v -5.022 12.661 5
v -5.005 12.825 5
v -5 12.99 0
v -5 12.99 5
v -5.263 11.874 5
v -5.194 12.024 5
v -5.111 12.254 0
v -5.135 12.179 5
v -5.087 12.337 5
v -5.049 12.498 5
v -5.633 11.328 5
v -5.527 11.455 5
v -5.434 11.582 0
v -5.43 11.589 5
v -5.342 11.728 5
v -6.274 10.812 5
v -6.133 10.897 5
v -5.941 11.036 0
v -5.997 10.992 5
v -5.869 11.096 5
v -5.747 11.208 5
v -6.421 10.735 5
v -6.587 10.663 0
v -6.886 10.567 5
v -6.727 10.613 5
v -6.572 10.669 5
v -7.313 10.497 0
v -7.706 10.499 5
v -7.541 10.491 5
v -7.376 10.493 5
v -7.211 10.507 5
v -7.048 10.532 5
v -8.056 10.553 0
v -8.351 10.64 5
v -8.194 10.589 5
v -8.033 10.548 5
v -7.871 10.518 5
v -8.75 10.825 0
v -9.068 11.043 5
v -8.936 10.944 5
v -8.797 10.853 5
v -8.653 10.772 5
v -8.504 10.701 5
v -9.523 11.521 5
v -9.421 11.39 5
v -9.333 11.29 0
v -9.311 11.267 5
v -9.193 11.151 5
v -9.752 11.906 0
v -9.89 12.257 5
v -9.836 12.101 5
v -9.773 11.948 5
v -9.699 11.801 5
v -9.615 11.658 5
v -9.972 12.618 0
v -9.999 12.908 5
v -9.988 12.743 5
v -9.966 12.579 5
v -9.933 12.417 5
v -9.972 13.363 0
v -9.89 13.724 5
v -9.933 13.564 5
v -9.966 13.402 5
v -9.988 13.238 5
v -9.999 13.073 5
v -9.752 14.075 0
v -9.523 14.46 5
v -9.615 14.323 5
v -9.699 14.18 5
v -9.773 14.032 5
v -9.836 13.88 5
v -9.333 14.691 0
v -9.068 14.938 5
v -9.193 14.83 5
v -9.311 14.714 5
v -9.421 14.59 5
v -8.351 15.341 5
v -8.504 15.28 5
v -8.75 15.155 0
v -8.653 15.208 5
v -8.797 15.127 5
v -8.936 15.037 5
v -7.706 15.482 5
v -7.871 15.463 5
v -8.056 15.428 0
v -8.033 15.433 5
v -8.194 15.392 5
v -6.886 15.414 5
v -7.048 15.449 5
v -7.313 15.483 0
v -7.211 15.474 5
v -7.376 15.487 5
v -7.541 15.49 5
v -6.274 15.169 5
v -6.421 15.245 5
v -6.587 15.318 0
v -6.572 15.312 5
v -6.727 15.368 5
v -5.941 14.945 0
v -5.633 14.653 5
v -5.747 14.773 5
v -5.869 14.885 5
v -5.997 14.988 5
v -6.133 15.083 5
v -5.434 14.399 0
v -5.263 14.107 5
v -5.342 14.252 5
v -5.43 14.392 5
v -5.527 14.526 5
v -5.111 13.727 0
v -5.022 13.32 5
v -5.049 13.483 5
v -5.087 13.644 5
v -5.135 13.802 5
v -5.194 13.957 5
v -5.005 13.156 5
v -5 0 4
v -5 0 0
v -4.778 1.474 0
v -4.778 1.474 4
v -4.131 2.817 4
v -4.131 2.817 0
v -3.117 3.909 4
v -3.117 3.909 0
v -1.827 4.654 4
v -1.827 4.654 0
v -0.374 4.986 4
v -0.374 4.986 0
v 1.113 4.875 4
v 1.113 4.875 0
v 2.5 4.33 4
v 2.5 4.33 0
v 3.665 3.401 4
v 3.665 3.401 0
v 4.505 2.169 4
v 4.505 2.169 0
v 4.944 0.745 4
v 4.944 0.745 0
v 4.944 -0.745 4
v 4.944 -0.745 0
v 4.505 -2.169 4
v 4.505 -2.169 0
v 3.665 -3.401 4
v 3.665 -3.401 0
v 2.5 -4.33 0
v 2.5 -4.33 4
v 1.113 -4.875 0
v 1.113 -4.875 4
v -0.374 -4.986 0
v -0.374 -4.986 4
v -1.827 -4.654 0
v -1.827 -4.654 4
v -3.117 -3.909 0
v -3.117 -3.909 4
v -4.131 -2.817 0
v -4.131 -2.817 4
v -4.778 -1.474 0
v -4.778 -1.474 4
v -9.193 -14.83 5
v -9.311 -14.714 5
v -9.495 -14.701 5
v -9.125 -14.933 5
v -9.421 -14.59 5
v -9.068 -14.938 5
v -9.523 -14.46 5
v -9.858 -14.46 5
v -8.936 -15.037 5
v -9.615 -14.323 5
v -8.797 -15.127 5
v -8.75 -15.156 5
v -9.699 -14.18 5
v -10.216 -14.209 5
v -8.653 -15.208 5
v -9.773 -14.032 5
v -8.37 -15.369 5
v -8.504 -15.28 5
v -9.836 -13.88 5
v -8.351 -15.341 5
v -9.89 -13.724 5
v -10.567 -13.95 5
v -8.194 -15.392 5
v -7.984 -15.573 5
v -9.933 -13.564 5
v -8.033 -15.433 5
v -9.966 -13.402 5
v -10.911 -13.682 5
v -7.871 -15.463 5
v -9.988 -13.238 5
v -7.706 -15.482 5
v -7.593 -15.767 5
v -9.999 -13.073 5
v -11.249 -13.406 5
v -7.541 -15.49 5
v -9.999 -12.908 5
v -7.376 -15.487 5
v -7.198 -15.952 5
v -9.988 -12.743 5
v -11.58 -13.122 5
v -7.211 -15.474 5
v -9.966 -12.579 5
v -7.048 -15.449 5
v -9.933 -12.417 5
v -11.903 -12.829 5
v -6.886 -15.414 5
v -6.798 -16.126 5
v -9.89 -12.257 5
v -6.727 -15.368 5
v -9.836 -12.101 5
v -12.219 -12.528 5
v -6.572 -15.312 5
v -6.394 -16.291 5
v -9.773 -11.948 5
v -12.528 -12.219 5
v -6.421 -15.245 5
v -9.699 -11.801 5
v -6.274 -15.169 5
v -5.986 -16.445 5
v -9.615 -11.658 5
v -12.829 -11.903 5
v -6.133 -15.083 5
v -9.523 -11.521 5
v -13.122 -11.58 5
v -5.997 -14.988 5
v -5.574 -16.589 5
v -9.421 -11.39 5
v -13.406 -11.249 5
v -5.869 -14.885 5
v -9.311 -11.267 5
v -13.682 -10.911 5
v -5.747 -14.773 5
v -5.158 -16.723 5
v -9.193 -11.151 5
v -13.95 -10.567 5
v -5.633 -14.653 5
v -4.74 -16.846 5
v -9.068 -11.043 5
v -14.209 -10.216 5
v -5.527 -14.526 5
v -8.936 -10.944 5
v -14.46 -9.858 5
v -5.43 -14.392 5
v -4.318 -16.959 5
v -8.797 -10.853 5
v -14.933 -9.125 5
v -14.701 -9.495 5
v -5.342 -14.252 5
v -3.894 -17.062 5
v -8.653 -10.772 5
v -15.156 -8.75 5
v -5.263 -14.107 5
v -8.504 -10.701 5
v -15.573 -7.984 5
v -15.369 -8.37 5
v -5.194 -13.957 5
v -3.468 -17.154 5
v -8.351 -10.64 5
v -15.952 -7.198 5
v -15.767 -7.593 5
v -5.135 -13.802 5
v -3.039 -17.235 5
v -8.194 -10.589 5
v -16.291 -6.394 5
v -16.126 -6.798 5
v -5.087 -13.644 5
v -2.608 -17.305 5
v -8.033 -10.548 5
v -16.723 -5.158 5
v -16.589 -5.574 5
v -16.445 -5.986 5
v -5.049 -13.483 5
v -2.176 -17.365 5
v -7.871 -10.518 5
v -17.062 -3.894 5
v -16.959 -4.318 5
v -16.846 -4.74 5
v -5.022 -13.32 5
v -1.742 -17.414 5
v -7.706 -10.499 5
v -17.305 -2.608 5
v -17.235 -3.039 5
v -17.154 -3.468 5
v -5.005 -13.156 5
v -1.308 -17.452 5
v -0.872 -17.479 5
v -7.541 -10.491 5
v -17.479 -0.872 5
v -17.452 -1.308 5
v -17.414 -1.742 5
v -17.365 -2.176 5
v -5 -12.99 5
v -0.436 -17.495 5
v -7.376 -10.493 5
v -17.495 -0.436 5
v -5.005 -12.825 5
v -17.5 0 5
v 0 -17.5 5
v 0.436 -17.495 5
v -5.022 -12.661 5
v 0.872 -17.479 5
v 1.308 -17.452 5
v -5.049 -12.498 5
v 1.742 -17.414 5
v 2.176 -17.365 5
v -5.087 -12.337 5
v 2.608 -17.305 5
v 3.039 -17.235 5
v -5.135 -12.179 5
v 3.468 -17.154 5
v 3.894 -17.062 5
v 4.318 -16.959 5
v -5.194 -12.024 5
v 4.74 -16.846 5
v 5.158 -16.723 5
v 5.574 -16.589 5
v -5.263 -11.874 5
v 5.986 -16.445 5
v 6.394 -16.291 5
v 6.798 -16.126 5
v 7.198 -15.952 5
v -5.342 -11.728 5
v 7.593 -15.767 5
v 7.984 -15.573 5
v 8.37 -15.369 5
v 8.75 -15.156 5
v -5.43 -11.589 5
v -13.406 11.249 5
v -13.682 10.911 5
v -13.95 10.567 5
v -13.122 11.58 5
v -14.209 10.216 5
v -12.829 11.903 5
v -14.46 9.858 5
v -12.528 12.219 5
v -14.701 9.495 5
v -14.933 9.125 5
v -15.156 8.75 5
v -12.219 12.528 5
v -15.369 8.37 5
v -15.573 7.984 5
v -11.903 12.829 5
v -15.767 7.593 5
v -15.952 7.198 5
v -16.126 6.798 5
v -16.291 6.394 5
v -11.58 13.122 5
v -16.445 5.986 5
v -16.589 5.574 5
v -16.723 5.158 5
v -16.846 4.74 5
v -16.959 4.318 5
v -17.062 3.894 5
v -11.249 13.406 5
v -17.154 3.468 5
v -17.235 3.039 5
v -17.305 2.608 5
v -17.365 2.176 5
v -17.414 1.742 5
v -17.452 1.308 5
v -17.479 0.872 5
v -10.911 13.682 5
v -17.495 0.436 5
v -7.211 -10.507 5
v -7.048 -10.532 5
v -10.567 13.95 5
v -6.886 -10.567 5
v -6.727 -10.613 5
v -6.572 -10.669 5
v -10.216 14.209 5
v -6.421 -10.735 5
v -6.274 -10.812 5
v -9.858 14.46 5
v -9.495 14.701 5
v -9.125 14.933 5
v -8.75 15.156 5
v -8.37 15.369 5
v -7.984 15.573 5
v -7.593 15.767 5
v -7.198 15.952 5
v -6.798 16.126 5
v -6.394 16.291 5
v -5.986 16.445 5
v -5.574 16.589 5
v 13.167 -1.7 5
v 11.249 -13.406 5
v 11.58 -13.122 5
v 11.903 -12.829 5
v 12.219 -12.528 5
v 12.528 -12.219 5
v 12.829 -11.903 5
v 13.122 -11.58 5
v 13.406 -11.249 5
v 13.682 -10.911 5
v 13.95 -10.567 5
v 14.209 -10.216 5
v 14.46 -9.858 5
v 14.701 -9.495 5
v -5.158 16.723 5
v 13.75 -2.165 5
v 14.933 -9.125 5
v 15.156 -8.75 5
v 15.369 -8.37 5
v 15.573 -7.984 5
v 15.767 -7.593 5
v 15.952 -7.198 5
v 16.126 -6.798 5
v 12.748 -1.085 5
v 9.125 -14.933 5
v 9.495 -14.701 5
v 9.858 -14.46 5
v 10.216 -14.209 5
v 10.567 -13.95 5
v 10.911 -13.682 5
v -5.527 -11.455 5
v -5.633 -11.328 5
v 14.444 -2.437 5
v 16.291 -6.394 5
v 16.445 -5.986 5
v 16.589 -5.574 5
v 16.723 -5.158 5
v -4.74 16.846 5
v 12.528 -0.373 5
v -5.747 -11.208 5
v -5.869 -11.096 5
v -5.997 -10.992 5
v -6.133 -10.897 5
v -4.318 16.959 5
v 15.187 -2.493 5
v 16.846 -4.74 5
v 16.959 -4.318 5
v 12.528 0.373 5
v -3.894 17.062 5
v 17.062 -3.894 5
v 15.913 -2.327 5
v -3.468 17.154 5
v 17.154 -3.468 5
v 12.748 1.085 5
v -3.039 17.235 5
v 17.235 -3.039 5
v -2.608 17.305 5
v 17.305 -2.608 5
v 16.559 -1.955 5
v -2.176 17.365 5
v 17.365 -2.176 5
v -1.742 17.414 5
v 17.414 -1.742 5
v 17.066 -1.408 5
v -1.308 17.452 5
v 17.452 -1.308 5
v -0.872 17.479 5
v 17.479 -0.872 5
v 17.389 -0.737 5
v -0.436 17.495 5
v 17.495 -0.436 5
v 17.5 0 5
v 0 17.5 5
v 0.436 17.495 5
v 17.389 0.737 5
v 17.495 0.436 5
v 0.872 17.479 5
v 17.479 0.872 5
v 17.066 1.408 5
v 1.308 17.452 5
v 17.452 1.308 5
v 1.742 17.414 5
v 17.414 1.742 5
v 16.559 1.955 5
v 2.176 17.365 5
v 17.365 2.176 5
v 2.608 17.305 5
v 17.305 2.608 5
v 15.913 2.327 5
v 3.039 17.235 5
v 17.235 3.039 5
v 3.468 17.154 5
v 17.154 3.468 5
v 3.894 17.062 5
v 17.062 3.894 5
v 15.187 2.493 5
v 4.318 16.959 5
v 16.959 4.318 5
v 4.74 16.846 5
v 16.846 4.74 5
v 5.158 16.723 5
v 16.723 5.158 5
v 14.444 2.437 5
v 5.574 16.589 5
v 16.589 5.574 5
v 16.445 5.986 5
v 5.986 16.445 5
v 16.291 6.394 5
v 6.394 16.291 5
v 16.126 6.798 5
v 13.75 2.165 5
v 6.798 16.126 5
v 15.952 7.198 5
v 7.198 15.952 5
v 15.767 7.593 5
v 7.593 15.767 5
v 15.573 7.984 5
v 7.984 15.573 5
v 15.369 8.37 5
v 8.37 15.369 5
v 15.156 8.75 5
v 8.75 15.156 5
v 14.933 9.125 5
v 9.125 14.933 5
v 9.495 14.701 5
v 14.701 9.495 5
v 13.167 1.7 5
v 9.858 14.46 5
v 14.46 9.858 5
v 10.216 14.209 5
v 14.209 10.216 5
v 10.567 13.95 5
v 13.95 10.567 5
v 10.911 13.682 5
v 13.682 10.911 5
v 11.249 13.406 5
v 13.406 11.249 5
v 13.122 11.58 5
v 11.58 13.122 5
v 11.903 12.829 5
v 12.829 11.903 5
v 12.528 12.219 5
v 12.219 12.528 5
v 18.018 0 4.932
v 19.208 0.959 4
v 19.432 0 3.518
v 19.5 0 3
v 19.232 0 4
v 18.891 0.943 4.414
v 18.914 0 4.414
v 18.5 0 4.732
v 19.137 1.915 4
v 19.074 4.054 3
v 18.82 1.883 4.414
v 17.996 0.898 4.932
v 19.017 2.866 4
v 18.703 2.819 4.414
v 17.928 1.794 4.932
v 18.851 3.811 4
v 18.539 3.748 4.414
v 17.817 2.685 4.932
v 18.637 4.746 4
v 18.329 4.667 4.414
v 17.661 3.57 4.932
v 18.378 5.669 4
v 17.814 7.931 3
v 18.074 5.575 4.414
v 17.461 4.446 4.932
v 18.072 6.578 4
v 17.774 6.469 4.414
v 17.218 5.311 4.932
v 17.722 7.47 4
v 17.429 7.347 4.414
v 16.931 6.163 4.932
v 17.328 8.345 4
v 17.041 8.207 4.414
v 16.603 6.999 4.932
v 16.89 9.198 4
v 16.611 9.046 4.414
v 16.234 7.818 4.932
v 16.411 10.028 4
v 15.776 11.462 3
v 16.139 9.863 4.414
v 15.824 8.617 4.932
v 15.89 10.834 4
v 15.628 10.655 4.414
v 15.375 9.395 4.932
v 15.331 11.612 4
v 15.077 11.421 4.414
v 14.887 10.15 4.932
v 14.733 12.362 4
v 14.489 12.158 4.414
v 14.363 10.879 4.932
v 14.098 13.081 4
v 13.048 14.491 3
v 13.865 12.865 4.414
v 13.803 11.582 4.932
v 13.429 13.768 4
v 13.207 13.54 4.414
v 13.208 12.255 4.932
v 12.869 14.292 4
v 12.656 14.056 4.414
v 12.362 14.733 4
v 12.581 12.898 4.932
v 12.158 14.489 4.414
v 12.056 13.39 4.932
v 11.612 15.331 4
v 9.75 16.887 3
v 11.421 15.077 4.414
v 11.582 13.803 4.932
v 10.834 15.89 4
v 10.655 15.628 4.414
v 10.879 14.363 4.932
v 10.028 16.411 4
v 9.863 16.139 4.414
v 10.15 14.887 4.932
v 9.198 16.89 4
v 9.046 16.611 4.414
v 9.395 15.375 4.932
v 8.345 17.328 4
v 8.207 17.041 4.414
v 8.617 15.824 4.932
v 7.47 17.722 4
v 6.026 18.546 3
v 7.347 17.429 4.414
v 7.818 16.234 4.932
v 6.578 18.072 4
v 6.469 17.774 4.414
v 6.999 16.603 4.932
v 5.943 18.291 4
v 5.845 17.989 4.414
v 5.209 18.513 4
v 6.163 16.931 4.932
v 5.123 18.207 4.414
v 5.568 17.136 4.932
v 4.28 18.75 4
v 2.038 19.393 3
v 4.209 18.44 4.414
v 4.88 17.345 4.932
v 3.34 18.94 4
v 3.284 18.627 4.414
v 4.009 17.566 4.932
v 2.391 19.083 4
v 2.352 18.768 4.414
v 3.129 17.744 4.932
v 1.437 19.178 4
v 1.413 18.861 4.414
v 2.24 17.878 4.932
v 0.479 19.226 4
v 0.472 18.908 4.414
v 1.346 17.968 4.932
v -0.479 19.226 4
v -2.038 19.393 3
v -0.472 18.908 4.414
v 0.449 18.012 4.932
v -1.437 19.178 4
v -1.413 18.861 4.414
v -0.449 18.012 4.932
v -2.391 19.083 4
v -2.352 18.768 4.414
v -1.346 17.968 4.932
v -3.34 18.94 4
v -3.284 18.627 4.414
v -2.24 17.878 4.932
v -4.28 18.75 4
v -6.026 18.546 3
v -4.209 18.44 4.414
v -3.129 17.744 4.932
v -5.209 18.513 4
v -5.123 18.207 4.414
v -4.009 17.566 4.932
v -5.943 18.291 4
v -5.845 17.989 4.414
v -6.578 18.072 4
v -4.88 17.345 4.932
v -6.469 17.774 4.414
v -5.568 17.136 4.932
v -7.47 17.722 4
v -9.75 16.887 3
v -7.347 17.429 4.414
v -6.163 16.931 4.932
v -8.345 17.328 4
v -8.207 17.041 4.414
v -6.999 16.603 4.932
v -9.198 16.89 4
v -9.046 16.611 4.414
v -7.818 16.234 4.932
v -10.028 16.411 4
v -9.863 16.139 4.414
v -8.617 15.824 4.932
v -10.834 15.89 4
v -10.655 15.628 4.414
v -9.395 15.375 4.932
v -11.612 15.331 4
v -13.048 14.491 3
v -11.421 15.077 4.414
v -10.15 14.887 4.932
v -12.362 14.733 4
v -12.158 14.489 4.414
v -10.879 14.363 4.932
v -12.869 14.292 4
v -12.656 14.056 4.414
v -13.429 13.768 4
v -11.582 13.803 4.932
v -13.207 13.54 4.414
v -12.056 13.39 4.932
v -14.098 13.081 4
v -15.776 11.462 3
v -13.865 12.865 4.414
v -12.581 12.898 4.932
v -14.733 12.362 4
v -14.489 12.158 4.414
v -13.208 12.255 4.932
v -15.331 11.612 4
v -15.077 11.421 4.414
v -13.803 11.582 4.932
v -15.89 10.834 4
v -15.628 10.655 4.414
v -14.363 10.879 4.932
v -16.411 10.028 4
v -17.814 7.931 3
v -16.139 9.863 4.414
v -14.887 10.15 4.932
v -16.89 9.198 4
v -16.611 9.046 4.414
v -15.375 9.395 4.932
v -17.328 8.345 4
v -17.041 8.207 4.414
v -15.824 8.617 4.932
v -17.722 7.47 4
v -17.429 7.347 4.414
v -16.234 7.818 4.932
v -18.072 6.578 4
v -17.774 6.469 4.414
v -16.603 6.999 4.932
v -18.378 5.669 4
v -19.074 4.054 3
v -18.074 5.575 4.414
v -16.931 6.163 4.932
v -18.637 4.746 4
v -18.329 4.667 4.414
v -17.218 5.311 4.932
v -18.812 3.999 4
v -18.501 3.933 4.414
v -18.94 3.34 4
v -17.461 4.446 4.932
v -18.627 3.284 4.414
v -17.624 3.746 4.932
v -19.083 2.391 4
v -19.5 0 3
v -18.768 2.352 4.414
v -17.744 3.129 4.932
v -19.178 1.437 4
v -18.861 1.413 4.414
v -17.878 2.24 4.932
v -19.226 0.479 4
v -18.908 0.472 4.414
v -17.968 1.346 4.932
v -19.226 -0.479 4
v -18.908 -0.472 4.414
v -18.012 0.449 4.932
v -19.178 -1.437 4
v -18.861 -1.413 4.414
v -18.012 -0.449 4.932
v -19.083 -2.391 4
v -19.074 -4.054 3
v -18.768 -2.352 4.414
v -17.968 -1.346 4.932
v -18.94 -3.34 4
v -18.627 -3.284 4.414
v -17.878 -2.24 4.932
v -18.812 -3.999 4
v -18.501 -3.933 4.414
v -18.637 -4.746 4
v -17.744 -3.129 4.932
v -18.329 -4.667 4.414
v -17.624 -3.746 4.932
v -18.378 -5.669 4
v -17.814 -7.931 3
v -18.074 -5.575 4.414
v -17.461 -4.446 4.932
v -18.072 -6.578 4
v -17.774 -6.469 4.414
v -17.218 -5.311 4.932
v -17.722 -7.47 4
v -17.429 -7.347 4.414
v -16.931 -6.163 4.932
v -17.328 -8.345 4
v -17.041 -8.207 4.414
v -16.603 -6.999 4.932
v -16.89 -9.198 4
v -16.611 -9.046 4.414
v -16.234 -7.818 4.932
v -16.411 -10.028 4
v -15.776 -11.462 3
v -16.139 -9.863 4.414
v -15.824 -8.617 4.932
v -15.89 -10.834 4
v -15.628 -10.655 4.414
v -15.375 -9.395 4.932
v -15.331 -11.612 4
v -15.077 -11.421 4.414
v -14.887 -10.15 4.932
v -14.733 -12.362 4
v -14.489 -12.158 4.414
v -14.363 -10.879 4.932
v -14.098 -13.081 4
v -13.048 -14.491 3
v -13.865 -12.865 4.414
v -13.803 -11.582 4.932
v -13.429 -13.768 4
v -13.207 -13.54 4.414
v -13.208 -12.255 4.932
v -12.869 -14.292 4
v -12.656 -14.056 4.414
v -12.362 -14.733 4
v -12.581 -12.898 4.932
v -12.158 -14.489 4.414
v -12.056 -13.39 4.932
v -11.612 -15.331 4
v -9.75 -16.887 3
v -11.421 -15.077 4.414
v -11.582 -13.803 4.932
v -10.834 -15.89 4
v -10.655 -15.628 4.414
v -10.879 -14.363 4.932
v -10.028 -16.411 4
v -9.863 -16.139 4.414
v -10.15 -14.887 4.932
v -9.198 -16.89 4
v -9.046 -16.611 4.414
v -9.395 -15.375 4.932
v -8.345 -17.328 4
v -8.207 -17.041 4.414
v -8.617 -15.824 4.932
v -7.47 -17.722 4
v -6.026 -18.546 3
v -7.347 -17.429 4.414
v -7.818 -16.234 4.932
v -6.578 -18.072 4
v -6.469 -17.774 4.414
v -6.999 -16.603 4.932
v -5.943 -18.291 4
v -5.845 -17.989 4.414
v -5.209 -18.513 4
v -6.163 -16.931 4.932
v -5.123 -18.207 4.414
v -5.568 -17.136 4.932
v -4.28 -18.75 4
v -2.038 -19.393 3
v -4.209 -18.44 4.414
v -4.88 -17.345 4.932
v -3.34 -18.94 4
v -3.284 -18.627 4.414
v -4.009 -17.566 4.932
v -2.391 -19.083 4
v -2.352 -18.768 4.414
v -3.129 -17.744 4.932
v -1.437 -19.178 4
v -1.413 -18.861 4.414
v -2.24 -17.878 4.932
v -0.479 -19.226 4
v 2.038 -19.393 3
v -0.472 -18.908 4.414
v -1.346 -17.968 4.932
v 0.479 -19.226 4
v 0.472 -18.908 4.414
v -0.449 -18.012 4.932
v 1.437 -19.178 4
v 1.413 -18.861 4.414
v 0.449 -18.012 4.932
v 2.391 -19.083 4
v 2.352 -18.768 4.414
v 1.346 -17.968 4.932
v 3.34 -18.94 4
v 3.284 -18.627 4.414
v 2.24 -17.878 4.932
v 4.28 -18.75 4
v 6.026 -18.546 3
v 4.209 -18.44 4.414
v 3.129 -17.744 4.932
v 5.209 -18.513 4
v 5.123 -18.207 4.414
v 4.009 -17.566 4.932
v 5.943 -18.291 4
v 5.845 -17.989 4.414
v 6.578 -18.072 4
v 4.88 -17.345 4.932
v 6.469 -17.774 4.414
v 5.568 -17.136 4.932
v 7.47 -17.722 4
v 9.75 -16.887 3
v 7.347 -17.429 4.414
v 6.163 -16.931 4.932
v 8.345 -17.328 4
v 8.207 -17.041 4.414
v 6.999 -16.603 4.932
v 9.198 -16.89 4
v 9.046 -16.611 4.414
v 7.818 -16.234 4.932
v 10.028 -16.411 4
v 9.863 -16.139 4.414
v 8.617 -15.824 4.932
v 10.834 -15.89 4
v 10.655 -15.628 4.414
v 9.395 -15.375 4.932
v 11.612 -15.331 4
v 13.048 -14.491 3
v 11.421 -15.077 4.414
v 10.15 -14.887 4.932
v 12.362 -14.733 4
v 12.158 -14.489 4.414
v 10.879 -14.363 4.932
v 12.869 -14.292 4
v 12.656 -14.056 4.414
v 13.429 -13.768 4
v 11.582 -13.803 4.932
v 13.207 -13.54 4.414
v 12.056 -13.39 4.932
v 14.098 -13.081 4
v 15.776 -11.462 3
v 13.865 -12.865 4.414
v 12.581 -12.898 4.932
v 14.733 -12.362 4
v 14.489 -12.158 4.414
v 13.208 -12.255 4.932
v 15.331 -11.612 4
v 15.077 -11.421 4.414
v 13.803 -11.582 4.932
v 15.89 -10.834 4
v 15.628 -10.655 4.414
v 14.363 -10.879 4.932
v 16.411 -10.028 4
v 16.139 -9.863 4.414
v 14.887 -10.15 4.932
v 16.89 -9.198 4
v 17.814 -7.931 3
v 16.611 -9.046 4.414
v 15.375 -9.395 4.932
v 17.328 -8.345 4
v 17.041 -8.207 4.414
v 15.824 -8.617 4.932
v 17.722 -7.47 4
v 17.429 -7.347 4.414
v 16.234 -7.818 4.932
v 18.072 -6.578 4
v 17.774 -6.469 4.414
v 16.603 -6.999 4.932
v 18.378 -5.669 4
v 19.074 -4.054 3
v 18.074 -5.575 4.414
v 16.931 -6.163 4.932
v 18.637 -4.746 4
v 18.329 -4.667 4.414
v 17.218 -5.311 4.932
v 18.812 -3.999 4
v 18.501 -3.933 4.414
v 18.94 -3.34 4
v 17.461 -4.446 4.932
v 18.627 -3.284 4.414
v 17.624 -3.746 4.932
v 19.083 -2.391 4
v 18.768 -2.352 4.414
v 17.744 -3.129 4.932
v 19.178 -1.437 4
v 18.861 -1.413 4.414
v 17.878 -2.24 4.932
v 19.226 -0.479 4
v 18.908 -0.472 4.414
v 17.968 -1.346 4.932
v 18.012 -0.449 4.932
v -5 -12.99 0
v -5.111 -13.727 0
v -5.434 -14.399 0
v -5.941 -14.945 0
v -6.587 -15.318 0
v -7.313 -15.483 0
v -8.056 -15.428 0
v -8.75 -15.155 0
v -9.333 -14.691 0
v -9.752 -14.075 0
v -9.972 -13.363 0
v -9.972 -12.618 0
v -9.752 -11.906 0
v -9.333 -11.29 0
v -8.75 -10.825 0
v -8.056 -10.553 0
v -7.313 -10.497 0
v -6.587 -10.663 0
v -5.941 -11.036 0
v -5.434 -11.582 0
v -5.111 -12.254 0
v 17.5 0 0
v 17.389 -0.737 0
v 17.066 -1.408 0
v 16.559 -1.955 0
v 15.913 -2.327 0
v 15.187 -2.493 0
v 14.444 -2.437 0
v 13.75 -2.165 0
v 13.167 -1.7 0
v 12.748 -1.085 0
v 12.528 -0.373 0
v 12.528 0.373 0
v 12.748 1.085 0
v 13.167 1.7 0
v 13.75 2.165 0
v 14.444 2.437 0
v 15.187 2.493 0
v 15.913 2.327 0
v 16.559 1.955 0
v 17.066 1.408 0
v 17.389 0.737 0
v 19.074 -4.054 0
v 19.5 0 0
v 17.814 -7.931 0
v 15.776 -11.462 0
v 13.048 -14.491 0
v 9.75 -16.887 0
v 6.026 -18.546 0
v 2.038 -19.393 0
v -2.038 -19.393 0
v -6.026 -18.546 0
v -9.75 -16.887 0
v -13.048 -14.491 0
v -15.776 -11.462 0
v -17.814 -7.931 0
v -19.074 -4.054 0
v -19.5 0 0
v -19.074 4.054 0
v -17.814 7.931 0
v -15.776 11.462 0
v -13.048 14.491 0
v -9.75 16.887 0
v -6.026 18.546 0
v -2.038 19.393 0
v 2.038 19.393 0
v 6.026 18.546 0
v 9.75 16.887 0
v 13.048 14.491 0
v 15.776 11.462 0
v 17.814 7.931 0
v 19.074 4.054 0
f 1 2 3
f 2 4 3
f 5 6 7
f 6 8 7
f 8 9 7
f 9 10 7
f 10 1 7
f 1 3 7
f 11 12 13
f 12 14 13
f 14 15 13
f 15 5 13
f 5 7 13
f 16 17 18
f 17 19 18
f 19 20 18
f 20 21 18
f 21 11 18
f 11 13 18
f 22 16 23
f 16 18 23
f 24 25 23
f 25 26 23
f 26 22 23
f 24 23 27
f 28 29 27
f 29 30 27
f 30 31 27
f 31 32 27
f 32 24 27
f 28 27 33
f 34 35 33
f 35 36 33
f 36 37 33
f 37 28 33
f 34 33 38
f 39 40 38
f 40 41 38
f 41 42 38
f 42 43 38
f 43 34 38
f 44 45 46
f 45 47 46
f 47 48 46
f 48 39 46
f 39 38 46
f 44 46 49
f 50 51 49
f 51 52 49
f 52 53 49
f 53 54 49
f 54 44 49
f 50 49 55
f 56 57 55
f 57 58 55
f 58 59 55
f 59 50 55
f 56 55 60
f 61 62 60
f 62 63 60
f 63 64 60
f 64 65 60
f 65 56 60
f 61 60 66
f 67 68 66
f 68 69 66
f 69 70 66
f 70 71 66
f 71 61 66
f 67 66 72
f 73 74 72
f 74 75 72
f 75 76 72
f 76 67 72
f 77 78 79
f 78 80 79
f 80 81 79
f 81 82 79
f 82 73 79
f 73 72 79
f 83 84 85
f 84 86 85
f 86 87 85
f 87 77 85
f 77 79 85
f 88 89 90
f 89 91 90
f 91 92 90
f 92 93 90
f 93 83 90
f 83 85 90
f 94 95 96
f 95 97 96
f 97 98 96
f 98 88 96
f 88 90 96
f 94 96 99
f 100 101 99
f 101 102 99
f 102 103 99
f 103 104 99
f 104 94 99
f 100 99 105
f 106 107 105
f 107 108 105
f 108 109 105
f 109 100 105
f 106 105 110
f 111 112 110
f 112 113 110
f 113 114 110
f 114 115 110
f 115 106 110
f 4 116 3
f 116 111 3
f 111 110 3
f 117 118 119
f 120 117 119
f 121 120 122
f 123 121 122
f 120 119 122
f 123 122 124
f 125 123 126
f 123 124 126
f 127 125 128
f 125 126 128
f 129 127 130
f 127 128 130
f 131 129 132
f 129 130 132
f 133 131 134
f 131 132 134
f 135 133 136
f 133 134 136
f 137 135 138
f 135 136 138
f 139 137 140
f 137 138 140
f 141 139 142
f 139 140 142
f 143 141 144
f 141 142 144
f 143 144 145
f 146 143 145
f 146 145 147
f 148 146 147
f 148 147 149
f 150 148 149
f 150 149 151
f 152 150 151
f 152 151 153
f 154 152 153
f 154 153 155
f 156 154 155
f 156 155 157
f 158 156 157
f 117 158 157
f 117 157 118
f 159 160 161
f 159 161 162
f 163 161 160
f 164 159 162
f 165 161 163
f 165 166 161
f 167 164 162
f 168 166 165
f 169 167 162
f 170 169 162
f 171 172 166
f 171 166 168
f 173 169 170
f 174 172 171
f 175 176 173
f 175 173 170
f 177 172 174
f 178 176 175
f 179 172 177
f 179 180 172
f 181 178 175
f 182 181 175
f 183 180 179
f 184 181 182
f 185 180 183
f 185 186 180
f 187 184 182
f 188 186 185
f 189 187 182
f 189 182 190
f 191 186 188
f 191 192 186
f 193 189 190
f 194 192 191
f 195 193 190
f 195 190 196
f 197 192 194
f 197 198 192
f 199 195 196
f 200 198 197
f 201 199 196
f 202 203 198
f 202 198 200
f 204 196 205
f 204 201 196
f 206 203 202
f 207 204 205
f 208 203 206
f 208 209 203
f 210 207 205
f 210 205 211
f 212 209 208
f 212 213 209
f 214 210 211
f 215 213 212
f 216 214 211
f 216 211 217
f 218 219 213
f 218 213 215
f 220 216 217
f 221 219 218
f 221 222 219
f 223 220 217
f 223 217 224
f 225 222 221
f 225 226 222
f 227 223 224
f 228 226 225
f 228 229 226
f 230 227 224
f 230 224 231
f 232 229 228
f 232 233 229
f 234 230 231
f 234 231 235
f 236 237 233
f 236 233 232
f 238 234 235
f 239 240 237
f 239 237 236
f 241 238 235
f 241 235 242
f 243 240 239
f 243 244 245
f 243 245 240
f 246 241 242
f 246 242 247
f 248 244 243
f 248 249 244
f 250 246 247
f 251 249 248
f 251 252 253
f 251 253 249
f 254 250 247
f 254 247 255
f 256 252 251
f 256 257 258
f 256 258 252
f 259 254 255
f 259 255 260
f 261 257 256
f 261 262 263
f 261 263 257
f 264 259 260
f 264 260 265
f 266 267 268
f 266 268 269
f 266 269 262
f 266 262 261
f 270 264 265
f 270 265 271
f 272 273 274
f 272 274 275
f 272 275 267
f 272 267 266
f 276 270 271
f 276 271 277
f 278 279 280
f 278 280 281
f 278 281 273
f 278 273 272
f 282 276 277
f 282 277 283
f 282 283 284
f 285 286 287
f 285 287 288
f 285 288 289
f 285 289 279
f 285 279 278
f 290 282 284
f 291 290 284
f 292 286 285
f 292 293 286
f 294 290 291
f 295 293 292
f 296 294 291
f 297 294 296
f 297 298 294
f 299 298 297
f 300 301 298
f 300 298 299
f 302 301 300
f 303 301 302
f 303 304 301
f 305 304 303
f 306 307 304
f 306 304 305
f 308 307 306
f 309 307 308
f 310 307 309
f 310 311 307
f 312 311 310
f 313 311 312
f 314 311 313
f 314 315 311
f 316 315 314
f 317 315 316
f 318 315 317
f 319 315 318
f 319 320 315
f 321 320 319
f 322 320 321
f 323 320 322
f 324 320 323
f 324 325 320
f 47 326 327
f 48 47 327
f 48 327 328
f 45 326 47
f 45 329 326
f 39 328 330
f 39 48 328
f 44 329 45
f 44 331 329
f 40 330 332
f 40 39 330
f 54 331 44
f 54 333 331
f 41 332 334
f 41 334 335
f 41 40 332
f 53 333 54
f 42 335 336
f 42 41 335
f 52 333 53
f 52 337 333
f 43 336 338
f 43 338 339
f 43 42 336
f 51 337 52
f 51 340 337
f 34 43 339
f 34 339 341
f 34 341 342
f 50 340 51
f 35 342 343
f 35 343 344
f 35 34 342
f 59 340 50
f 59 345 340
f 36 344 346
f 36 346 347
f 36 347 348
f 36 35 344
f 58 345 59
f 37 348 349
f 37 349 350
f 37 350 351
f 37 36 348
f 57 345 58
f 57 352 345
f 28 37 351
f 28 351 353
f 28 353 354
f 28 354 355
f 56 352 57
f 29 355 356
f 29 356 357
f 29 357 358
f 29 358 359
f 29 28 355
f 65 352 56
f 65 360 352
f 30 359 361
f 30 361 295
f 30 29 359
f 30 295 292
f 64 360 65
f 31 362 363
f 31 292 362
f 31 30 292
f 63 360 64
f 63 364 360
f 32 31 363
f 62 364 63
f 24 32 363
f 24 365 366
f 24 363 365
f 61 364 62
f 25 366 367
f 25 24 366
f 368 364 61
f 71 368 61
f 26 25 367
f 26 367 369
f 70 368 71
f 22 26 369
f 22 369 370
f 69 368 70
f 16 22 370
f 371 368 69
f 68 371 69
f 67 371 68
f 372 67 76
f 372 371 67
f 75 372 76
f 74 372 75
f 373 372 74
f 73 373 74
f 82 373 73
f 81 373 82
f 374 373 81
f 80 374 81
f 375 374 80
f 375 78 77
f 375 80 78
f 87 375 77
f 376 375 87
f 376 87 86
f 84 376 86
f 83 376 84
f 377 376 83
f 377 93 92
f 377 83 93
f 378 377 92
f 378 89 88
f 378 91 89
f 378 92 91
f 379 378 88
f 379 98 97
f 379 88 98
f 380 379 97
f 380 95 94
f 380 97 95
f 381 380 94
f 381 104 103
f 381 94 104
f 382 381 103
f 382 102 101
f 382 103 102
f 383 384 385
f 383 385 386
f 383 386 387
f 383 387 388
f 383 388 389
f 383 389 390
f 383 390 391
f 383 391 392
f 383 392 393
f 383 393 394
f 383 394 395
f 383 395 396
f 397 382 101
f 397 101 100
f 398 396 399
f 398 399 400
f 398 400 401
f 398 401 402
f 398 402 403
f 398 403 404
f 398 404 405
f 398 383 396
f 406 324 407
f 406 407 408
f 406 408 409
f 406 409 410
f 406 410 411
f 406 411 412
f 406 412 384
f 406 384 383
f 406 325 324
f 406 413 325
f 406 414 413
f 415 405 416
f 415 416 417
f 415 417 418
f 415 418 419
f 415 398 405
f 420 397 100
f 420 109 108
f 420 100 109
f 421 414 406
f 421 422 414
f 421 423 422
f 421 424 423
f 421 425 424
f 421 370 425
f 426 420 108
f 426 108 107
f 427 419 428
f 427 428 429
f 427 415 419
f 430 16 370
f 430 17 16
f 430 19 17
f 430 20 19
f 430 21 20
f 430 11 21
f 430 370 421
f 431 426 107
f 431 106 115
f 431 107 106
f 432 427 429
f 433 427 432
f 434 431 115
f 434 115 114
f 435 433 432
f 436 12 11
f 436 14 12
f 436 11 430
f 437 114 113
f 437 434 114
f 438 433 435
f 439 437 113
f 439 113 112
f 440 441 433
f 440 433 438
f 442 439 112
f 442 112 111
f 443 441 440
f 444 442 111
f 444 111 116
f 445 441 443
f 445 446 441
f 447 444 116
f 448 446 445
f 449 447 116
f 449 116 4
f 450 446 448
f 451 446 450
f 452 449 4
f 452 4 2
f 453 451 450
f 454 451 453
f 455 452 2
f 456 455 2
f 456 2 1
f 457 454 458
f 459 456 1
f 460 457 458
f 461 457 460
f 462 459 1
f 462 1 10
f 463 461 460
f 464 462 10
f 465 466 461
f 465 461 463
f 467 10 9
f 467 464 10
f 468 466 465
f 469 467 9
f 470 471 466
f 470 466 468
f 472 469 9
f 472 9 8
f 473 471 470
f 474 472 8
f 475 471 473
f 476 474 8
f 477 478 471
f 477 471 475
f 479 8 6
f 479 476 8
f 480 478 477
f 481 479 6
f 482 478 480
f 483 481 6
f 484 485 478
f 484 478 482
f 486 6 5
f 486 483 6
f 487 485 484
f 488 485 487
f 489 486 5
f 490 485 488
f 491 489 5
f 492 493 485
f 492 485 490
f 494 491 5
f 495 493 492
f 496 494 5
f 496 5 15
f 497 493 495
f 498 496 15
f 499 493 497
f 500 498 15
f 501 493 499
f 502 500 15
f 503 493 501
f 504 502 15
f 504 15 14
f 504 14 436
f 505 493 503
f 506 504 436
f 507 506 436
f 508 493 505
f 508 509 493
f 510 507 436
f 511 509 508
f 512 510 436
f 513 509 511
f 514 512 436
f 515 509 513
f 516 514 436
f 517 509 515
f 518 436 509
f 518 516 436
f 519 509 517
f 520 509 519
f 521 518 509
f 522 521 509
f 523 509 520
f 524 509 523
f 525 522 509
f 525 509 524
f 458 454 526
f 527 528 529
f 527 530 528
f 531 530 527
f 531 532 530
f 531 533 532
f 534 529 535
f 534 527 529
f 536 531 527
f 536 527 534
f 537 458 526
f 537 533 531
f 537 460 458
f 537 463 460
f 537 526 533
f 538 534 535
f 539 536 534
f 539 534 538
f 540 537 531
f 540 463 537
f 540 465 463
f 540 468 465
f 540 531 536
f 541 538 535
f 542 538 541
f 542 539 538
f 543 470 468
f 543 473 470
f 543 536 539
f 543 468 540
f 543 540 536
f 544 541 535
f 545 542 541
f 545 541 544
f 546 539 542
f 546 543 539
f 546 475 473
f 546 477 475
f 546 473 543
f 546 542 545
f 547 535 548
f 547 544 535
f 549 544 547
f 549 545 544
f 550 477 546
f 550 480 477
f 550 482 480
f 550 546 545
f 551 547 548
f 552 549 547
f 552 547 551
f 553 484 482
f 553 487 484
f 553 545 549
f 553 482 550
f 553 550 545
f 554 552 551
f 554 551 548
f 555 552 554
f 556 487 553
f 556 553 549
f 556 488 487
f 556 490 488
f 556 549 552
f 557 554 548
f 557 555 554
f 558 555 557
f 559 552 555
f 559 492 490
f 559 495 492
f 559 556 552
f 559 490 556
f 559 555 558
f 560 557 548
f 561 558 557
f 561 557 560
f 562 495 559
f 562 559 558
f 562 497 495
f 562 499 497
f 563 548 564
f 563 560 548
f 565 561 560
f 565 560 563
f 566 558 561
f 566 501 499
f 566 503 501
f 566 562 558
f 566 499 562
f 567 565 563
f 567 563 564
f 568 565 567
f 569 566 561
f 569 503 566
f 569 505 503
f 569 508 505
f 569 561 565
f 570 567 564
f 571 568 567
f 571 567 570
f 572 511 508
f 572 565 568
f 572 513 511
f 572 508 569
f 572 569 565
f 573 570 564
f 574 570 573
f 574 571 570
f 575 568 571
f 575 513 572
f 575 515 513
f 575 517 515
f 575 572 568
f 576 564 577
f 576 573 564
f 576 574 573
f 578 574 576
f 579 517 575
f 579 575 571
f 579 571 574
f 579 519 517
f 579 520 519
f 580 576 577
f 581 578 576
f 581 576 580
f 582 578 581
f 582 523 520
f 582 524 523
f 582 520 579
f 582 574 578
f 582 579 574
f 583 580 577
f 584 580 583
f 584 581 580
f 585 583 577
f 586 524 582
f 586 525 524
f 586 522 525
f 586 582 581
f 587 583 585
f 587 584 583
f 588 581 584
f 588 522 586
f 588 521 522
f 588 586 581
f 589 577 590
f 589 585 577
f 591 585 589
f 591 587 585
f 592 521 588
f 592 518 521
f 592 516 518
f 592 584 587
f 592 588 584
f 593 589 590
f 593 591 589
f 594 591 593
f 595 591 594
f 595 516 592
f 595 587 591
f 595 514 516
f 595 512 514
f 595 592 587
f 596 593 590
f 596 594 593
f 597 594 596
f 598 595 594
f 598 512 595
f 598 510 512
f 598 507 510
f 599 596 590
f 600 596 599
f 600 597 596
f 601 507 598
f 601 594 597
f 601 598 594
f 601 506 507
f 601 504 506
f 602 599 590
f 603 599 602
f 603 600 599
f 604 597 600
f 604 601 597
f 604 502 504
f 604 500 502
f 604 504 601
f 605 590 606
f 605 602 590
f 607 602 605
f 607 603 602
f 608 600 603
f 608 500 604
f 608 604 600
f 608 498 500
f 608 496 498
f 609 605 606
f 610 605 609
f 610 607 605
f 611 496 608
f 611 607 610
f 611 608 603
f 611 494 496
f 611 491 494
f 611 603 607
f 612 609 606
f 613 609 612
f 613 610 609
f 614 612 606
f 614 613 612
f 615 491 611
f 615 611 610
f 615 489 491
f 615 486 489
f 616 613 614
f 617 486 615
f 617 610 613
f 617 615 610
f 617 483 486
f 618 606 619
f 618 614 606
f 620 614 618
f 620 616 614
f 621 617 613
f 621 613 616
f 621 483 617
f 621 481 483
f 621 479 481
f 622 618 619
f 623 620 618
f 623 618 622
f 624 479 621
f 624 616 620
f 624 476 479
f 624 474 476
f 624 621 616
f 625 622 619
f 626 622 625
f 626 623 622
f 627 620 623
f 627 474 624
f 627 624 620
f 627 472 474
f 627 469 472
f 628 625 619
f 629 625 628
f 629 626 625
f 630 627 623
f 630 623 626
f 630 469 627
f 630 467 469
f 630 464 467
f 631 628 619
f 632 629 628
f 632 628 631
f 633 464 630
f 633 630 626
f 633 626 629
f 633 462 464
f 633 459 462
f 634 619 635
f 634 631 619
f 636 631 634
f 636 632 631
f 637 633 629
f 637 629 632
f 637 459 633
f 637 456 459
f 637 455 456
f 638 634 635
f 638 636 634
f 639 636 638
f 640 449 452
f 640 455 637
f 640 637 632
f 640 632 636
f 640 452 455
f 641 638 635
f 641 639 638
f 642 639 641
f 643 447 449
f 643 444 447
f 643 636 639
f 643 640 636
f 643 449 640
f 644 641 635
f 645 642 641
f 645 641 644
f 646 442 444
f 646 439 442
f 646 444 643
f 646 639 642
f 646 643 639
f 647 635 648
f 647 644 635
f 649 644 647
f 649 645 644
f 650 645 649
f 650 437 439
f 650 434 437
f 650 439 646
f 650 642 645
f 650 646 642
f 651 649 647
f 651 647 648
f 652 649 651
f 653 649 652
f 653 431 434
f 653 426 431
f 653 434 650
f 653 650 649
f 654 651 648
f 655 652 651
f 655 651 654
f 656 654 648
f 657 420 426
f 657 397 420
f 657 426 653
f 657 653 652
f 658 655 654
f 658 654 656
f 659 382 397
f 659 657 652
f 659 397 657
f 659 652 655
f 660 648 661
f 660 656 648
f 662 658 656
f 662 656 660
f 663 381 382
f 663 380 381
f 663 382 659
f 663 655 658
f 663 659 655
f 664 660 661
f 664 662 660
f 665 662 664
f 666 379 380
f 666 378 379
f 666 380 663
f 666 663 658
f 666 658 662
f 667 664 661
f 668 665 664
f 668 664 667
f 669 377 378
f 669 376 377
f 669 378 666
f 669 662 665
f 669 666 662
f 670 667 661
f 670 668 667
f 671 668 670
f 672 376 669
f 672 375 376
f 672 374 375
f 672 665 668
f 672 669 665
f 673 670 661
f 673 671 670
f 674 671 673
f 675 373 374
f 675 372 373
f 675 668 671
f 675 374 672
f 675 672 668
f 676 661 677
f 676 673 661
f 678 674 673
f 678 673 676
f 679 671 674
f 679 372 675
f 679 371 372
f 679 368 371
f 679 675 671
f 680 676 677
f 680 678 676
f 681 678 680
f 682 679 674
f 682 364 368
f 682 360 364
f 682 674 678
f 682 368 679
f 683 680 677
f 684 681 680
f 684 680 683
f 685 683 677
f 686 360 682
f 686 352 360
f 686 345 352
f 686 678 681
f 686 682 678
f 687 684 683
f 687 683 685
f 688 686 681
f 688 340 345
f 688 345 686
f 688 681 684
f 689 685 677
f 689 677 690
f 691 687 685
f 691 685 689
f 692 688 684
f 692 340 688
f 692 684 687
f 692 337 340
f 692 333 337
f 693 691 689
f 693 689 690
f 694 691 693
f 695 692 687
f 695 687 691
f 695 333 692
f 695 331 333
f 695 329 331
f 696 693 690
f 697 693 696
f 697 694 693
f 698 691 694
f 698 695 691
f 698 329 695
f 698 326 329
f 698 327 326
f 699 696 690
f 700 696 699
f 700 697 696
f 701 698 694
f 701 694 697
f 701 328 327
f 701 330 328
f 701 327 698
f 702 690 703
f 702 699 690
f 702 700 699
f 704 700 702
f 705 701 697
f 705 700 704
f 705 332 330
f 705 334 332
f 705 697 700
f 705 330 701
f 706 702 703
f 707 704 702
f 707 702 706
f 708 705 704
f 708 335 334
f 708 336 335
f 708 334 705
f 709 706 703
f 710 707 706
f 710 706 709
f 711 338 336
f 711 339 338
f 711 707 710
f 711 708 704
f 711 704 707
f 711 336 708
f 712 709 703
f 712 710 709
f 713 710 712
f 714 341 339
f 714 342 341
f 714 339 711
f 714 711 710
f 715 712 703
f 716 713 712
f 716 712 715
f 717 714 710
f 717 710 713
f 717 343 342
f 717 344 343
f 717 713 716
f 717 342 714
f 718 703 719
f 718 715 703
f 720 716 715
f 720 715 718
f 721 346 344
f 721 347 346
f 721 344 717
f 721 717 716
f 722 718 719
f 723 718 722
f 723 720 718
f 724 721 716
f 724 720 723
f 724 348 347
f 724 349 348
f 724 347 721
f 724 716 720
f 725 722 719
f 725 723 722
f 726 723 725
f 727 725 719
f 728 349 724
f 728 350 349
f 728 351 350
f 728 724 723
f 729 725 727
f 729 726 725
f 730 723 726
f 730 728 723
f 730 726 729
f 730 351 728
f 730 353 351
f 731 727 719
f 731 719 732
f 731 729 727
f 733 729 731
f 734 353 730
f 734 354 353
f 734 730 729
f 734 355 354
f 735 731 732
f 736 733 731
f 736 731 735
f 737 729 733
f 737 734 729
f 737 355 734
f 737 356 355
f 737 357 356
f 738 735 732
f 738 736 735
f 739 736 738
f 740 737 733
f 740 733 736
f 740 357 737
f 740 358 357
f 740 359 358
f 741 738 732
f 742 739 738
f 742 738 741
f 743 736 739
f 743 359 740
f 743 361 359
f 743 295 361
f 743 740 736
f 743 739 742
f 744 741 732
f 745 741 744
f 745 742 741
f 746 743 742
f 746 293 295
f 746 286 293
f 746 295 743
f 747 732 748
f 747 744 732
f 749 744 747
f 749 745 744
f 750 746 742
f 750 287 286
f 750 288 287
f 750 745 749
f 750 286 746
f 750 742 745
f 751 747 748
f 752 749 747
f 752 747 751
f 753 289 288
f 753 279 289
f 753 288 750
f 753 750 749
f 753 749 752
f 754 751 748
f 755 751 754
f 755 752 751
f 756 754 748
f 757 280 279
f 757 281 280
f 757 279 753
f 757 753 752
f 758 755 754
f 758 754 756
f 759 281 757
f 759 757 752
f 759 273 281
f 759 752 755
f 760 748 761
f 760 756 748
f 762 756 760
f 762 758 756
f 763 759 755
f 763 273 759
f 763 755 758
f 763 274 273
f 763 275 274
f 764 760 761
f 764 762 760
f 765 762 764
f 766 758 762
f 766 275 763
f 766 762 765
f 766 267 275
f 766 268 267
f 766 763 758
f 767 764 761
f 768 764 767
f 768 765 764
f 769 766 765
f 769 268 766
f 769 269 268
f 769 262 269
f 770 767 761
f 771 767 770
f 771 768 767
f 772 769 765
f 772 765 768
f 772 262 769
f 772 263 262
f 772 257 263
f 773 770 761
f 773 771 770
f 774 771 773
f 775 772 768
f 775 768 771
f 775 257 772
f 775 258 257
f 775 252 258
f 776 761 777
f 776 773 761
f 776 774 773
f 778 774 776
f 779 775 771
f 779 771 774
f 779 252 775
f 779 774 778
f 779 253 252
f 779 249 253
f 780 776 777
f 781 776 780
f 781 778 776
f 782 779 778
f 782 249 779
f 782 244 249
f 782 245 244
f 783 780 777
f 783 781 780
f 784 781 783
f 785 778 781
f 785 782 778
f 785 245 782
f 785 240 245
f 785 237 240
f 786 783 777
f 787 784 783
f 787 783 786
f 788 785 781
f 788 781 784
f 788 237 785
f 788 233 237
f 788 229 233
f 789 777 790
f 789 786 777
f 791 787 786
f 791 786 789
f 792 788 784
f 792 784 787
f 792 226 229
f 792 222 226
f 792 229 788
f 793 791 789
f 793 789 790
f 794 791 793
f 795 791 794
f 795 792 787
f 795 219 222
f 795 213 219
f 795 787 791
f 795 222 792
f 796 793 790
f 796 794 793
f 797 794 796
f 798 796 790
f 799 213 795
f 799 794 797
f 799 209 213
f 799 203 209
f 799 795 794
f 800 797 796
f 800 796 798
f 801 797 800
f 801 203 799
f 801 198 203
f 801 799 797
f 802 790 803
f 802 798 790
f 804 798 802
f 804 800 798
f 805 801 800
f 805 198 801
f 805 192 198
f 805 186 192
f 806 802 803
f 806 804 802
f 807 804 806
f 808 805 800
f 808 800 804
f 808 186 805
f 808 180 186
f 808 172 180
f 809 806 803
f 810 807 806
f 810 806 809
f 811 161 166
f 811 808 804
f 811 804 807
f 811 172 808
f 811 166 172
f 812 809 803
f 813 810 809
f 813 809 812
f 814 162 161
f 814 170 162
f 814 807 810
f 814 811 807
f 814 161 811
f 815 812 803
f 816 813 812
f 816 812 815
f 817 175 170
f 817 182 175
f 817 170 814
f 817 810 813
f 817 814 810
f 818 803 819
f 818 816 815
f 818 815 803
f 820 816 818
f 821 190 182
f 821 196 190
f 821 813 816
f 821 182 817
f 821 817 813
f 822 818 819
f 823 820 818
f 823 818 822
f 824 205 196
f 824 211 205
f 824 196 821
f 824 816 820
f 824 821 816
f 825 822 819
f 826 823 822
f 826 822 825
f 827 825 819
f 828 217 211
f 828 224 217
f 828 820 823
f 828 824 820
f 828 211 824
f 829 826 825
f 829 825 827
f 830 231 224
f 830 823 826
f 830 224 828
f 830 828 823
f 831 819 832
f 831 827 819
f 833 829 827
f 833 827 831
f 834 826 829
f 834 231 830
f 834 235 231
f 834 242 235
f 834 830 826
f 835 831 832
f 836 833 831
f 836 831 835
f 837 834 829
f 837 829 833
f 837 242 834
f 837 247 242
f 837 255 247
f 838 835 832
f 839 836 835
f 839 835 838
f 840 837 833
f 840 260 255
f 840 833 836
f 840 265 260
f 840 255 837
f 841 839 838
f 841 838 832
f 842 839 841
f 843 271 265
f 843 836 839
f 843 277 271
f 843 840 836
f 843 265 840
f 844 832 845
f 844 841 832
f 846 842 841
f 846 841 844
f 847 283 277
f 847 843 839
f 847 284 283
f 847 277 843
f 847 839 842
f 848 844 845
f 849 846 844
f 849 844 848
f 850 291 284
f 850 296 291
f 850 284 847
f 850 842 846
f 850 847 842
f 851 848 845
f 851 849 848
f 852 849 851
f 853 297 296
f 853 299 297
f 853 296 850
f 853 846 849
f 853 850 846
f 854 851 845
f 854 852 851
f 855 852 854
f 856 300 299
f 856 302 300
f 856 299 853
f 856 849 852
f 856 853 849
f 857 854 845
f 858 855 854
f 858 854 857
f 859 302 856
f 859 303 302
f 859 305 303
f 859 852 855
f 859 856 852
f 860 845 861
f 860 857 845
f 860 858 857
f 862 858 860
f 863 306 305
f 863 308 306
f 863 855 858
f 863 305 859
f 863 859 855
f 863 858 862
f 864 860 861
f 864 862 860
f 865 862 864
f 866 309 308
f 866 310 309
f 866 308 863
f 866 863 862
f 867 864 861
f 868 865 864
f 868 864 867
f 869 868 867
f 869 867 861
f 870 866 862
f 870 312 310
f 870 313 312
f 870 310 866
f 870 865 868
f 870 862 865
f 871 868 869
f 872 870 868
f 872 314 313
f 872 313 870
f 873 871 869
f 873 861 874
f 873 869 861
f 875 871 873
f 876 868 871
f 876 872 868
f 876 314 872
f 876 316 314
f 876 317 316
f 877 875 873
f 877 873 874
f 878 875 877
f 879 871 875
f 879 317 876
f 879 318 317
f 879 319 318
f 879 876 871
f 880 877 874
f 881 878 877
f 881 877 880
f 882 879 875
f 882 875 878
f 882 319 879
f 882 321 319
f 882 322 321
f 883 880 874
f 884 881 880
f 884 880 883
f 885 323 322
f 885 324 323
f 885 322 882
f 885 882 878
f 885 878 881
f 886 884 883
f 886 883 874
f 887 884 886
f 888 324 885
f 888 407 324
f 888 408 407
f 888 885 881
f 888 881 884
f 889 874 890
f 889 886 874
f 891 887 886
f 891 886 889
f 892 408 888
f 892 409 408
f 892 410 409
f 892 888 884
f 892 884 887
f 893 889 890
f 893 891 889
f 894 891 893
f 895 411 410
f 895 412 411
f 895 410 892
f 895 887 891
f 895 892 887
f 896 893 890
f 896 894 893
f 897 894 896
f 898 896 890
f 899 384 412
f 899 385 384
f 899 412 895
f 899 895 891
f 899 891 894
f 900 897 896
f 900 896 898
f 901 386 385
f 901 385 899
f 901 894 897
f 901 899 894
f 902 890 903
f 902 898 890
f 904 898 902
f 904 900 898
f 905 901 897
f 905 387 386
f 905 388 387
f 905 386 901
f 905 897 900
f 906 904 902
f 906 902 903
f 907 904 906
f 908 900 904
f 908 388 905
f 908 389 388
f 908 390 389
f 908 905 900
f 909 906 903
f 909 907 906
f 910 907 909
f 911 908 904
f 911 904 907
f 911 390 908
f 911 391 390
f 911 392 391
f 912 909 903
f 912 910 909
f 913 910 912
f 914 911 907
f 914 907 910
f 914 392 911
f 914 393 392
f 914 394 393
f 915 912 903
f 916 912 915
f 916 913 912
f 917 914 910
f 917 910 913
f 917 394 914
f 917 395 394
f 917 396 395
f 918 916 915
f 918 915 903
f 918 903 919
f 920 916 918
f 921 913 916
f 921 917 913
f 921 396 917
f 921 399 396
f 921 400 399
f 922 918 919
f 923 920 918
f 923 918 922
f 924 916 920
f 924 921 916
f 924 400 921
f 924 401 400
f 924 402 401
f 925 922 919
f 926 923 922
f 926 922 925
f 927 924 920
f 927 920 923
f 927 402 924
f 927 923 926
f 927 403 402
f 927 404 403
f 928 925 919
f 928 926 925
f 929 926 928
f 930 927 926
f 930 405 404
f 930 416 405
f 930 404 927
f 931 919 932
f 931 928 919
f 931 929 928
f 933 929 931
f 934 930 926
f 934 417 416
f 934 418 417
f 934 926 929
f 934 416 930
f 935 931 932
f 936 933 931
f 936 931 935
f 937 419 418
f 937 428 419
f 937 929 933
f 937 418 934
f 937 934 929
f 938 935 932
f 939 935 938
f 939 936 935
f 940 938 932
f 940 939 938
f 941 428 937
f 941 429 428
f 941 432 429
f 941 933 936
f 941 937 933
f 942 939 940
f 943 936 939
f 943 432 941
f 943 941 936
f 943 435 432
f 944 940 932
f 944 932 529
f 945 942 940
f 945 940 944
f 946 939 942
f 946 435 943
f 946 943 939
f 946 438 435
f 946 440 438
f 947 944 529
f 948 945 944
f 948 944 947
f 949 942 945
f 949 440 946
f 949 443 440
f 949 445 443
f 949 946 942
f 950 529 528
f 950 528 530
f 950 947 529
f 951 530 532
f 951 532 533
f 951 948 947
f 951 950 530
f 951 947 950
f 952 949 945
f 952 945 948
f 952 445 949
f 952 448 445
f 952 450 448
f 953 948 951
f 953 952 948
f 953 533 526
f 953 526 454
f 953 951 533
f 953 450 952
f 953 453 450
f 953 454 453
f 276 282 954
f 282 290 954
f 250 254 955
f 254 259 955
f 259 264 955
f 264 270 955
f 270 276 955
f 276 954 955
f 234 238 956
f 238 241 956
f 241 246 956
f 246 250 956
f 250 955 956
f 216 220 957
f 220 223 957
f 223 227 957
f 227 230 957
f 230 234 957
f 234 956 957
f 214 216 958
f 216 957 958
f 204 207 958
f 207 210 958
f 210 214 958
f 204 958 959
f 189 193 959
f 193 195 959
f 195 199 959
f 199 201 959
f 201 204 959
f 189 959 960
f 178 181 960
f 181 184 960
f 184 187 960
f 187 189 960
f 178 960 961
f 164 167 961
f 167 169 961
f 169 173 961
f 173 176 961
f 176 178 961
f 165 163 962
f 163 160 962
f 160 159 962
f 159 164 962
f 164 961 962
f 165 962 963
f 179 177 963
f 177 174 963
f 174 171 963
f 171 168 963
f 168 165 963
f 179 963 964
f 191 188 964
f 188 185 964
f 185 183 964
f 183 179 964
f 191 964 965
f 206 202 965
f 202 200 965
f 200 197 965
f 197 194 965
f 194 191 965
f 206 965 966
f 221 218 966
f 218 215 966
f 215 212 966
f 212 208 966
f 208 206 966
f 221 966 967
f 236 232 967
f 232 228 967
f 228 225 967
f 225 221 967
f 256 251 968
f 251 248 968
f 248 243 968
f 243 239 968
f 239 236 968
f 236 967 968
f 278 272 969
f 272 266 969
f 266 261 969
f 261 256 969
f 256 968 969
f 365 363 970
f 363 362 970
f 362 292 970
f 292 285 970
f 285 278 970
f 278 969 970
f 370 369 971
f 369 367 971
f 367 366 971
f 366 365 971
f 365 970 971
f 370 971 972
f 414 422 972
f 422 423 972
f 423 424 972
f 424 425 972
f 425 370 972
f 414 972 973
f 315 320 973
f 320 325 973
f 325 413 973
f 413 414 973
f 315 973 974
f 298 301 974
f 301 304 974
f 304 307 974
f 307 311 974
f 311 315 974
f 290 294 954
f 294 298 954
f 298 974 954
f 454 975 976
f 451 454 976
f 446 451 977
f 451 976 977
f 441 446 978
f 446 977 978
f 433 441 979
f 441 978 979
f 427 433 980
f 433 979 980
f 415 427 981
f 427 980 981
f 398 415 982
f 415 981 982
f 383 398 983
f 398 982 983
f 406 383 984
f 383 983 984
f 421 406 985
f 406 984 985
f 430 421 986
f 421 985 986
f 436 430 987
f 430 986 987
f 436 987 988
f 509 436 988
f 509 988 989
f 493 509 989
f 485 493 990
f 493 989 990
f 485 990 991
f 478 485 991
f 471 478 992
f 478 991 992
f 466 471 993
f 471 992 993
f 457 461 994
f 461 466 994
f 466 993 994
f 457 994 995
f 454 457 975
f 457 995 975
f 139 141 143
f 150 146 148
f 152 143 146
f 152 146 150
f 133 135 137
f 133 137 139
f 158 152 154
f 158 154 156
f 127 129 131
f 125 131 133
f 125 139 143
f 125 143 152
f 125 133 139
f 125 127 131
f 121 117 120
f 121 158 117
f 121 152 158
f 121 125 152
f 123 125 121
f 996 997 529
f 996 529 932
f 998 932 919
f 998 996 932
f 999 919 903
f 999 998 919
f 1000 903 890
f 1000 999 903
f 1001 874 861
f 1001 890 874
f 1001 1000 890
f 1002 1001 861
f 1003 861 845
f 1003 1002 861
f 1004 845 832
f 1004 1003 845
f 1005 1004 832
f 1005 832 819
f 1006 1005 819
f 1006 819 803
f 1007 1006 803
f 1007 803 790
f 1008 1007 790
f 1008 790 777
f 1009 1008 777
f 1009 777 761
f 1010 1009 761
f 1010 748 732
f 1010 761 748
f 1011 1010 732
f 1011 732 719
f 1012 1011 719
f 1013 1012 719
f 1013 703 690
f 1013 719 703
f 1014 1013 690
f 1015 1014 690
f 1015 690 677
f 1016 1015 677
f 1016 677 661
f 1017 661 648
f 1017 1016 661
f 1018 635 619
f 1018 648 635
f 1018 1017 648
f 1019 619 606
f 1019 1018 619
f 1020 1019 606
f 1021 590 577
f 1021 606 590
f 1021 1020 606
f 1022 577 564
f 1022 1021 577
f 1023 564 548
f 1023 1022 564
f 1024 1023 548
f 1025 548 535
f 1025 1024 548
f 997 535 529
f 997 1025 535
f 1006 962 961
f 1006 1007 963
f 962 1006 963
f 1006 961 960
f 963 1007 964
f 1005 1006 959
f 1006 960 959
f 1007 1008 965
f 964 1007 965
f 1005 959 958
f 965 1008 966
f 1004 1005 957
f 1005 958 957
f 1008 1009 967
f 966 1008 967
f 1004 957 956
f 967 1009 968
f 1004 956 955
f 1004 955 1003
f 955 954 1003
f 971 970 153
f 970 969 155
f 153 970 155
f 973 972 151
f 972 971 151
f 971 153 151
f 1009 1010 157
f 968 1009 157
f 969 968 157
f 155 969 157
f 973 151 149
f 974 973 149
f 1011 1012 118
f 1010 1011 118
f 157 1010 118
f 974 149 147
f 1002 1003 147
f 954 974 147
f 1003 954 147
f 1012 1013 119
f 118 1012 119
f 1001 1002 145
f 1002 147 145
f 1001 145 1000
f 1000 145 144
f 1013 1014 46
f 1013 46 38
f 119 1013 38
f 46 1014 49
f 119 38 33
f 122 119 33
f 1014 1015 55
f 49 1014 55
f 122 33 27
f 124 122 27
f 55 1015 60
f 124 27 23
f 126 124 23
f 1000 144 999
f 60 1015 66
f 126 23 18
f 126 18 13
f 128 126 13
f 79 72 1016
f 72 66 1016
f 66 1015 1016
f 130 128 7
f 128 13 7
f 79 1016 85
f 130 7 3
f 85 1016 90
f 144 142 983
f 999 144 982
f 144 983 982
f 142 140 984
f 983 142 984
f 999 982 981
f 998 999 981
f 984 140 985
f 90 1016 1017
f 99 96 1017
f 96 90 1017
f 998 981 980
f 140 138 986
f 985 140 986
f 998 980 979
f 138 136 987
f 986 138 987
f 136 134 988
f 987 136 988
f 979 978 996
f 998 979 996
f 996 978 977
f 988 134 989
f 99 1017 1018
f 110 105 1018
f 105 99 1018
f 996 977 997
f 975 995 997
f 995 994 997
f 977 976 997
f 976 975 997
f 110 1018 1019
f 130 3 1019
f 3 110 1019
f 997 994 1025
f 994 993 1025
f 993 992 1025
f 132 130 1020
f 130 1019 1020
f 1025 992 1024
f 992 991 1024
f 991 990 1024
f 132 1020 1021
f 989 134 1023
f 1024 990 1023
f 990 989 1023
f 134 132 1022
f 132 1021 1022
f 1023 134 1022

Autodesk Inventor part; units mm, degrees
ref_plane "YZ Plane" through (0, 0, 0) normal (1, 0, 0) x (0, 1, 0)
ref_plane "XZ Plane" through (0, 0, 0) normal (0, 1, 0) x (-1, 0, 0)
ref_plane "XY Plane" through (0, 0, 0) normal (0, 0, 1) x (1, 0, 0)
sketch "Sketch1" plane through (0, 0, 0) normal (0, 0, 1) x (1, 0, 0)
  circle A0 centre (0, 0) radius 19.5
  circle A1 centre (15, 0) radius 2.5
  circle A2 centre (-7.5, 12.9904) radius 2.5
  circle A3 centre (-7.5, -12.9904) radius 2.5
  dimension "d0" = 39
  dimension "d1" = 5
  dimension "d2" = 15
  dimension "d5" = 360
extrude "Extrusion1" add sketch "Sketch1" along normal blind 5
sketch "Sketch2" plane through (0, 0, 0) normal (0, 0, -1) x (-1, 0, 0)
  circle A0 centre (0, 0) radius 5
  dimension "d9" = 10
extrude "Extrusion2" cut sketch "Sketch2" against normal blind 4
fillet "Fillet1" radius 2 1 edges at (-19.5, 0, 5)
properties part number "AA049" material "ABS Plastic"
